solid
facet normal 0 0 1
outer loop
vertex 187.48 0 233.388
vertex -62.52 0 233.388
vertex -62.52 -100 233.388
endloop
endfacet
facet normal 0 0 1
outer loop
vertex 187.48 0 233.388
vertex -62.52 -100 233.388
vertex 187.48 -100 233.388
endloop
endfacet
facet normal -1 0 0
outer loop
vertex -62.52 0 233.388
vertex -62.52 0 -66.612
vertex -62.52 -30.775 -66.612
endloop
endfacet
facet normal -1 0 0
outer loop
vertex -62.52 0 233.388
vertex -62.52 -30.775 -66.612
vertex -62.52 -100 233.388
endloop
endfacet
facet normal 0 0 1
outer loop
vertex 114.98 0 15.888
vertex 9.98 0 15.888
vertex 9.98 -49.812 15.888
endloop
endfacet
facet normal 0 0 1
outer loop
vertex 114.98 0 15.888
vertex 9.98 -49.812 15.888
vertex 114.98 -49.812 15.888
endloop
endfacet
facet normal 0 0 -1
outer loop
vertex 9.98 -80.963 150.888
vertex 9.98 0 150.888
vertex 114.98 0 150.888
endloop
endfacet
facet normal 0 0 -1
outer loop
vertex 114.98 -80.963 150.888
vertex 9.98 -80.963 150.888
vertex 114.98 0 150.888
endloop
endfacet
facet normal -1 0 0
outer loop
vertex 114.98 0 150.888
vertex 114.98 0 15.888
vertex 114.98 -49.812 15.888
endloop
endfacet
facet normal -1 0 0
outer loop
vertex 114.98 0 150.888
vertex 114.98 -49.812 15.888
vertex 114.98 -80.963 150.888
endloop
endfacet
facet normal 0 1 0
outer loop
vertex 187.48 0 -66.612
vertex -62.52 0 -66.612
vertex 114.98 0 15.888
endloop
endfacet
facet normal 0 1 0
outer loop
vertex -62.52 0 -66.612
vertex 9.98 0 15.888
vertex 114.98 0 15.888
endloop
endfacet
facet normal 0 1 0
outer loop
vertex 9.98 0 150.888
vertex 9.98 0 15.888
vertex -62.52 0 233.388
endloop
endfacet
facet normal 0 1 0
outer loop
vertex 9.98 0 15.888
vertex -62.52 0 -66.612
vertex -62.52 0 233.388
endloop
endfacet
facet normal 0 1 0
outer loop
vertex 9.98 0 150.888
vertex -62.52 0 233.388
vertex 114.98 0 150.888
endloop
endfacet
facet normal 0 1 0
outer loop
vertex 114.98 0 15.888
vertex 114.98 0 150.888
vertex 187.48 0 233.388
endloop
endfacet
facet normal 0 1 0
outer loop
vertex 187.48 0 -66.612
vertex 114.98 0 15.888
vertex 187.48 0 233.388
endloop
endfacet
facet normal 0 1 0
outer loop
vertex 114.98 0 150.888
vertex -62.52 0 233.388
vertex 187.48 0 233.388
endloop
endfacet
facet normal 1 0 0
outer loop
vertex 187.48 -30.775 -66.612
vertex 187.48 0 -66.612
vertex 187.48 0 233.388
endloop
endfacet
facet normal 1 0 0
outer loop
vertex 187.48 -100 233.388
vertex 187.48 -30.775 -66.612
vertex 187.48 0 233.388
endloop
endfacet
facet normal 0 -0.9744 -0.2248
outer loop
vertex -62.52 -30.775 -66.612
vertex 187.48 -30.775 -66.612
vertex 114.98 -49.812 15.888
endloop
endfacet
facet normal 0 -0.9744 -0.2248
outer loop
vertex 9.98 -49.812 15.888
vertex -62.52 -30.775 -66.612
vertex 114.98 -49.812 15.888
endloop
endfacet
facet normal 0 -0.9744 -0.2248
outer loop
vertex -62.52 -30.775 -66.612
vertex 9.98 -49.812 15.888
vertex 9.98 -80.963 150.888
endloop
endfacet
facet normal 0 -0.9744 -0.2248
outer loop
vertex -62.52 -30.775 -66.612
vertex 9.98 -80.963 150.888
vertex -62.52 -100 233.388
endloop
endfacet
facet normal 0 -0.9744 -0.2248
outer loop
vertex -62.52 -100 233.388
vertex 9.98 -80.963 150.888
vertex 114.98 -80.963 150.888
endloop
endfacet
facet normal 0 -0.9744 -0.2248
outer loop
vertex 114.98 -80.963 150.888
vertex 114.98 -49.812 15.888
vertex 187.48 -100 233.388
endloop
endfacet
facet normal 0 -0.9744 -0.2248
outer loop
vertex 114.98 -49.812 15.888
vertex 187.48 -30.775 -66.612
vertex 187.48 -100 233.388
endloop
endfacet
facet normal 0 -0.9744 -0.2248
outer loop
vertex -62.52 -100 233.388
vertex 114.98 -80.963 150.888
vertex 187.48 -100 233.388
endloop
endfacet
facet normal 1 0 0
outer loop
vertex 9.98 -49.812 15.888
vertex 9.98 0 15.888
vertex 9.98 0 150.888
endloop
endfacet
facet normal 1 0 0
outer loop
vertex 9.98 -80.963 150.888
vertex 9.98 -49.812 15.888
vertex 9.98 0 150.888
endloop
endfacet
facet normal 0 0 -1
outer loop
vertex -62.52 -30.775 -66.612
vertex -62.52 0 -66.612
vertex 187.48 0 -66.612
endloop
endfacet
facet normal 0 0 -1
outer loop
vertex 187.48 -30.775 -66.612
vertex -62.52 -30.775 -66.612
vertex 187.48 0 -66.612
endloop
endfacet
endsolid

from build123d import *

# Parameters (mm, degrees)
F0_W     = 250
F0_H     = 300
F0_W_2   = 105
F0_H_2   = 135
F1_DEPTH = 100
F3_DEPTH = 297


with BuildPart() as f1:
    # F0 (on Front) → F1 (new body)
    with BuildSketch(Plane.XZ):
        with Locations((62.479706, 83.388156)):
            Rectangle(F0_W, F0_H)
        with Locations((62.479706, 83.388156)):
            Rectangle(F0_W_2, F0_H_2, mode=Mode.SUBTRACT)
    extrude(amount=F1_DEPTH)

    # F2 (on face) → F3 (cut)
    with BuildSketch(Plane.YZ.offset(187.479706)):
        Polygon((-30.774537, -66.611844), (-100, 233.388156), (-100, -66.611844), align=None)
    extrude(amount=-F3_DEPTH, mode=Mode.SUBTRACT)


solid = f1.part
